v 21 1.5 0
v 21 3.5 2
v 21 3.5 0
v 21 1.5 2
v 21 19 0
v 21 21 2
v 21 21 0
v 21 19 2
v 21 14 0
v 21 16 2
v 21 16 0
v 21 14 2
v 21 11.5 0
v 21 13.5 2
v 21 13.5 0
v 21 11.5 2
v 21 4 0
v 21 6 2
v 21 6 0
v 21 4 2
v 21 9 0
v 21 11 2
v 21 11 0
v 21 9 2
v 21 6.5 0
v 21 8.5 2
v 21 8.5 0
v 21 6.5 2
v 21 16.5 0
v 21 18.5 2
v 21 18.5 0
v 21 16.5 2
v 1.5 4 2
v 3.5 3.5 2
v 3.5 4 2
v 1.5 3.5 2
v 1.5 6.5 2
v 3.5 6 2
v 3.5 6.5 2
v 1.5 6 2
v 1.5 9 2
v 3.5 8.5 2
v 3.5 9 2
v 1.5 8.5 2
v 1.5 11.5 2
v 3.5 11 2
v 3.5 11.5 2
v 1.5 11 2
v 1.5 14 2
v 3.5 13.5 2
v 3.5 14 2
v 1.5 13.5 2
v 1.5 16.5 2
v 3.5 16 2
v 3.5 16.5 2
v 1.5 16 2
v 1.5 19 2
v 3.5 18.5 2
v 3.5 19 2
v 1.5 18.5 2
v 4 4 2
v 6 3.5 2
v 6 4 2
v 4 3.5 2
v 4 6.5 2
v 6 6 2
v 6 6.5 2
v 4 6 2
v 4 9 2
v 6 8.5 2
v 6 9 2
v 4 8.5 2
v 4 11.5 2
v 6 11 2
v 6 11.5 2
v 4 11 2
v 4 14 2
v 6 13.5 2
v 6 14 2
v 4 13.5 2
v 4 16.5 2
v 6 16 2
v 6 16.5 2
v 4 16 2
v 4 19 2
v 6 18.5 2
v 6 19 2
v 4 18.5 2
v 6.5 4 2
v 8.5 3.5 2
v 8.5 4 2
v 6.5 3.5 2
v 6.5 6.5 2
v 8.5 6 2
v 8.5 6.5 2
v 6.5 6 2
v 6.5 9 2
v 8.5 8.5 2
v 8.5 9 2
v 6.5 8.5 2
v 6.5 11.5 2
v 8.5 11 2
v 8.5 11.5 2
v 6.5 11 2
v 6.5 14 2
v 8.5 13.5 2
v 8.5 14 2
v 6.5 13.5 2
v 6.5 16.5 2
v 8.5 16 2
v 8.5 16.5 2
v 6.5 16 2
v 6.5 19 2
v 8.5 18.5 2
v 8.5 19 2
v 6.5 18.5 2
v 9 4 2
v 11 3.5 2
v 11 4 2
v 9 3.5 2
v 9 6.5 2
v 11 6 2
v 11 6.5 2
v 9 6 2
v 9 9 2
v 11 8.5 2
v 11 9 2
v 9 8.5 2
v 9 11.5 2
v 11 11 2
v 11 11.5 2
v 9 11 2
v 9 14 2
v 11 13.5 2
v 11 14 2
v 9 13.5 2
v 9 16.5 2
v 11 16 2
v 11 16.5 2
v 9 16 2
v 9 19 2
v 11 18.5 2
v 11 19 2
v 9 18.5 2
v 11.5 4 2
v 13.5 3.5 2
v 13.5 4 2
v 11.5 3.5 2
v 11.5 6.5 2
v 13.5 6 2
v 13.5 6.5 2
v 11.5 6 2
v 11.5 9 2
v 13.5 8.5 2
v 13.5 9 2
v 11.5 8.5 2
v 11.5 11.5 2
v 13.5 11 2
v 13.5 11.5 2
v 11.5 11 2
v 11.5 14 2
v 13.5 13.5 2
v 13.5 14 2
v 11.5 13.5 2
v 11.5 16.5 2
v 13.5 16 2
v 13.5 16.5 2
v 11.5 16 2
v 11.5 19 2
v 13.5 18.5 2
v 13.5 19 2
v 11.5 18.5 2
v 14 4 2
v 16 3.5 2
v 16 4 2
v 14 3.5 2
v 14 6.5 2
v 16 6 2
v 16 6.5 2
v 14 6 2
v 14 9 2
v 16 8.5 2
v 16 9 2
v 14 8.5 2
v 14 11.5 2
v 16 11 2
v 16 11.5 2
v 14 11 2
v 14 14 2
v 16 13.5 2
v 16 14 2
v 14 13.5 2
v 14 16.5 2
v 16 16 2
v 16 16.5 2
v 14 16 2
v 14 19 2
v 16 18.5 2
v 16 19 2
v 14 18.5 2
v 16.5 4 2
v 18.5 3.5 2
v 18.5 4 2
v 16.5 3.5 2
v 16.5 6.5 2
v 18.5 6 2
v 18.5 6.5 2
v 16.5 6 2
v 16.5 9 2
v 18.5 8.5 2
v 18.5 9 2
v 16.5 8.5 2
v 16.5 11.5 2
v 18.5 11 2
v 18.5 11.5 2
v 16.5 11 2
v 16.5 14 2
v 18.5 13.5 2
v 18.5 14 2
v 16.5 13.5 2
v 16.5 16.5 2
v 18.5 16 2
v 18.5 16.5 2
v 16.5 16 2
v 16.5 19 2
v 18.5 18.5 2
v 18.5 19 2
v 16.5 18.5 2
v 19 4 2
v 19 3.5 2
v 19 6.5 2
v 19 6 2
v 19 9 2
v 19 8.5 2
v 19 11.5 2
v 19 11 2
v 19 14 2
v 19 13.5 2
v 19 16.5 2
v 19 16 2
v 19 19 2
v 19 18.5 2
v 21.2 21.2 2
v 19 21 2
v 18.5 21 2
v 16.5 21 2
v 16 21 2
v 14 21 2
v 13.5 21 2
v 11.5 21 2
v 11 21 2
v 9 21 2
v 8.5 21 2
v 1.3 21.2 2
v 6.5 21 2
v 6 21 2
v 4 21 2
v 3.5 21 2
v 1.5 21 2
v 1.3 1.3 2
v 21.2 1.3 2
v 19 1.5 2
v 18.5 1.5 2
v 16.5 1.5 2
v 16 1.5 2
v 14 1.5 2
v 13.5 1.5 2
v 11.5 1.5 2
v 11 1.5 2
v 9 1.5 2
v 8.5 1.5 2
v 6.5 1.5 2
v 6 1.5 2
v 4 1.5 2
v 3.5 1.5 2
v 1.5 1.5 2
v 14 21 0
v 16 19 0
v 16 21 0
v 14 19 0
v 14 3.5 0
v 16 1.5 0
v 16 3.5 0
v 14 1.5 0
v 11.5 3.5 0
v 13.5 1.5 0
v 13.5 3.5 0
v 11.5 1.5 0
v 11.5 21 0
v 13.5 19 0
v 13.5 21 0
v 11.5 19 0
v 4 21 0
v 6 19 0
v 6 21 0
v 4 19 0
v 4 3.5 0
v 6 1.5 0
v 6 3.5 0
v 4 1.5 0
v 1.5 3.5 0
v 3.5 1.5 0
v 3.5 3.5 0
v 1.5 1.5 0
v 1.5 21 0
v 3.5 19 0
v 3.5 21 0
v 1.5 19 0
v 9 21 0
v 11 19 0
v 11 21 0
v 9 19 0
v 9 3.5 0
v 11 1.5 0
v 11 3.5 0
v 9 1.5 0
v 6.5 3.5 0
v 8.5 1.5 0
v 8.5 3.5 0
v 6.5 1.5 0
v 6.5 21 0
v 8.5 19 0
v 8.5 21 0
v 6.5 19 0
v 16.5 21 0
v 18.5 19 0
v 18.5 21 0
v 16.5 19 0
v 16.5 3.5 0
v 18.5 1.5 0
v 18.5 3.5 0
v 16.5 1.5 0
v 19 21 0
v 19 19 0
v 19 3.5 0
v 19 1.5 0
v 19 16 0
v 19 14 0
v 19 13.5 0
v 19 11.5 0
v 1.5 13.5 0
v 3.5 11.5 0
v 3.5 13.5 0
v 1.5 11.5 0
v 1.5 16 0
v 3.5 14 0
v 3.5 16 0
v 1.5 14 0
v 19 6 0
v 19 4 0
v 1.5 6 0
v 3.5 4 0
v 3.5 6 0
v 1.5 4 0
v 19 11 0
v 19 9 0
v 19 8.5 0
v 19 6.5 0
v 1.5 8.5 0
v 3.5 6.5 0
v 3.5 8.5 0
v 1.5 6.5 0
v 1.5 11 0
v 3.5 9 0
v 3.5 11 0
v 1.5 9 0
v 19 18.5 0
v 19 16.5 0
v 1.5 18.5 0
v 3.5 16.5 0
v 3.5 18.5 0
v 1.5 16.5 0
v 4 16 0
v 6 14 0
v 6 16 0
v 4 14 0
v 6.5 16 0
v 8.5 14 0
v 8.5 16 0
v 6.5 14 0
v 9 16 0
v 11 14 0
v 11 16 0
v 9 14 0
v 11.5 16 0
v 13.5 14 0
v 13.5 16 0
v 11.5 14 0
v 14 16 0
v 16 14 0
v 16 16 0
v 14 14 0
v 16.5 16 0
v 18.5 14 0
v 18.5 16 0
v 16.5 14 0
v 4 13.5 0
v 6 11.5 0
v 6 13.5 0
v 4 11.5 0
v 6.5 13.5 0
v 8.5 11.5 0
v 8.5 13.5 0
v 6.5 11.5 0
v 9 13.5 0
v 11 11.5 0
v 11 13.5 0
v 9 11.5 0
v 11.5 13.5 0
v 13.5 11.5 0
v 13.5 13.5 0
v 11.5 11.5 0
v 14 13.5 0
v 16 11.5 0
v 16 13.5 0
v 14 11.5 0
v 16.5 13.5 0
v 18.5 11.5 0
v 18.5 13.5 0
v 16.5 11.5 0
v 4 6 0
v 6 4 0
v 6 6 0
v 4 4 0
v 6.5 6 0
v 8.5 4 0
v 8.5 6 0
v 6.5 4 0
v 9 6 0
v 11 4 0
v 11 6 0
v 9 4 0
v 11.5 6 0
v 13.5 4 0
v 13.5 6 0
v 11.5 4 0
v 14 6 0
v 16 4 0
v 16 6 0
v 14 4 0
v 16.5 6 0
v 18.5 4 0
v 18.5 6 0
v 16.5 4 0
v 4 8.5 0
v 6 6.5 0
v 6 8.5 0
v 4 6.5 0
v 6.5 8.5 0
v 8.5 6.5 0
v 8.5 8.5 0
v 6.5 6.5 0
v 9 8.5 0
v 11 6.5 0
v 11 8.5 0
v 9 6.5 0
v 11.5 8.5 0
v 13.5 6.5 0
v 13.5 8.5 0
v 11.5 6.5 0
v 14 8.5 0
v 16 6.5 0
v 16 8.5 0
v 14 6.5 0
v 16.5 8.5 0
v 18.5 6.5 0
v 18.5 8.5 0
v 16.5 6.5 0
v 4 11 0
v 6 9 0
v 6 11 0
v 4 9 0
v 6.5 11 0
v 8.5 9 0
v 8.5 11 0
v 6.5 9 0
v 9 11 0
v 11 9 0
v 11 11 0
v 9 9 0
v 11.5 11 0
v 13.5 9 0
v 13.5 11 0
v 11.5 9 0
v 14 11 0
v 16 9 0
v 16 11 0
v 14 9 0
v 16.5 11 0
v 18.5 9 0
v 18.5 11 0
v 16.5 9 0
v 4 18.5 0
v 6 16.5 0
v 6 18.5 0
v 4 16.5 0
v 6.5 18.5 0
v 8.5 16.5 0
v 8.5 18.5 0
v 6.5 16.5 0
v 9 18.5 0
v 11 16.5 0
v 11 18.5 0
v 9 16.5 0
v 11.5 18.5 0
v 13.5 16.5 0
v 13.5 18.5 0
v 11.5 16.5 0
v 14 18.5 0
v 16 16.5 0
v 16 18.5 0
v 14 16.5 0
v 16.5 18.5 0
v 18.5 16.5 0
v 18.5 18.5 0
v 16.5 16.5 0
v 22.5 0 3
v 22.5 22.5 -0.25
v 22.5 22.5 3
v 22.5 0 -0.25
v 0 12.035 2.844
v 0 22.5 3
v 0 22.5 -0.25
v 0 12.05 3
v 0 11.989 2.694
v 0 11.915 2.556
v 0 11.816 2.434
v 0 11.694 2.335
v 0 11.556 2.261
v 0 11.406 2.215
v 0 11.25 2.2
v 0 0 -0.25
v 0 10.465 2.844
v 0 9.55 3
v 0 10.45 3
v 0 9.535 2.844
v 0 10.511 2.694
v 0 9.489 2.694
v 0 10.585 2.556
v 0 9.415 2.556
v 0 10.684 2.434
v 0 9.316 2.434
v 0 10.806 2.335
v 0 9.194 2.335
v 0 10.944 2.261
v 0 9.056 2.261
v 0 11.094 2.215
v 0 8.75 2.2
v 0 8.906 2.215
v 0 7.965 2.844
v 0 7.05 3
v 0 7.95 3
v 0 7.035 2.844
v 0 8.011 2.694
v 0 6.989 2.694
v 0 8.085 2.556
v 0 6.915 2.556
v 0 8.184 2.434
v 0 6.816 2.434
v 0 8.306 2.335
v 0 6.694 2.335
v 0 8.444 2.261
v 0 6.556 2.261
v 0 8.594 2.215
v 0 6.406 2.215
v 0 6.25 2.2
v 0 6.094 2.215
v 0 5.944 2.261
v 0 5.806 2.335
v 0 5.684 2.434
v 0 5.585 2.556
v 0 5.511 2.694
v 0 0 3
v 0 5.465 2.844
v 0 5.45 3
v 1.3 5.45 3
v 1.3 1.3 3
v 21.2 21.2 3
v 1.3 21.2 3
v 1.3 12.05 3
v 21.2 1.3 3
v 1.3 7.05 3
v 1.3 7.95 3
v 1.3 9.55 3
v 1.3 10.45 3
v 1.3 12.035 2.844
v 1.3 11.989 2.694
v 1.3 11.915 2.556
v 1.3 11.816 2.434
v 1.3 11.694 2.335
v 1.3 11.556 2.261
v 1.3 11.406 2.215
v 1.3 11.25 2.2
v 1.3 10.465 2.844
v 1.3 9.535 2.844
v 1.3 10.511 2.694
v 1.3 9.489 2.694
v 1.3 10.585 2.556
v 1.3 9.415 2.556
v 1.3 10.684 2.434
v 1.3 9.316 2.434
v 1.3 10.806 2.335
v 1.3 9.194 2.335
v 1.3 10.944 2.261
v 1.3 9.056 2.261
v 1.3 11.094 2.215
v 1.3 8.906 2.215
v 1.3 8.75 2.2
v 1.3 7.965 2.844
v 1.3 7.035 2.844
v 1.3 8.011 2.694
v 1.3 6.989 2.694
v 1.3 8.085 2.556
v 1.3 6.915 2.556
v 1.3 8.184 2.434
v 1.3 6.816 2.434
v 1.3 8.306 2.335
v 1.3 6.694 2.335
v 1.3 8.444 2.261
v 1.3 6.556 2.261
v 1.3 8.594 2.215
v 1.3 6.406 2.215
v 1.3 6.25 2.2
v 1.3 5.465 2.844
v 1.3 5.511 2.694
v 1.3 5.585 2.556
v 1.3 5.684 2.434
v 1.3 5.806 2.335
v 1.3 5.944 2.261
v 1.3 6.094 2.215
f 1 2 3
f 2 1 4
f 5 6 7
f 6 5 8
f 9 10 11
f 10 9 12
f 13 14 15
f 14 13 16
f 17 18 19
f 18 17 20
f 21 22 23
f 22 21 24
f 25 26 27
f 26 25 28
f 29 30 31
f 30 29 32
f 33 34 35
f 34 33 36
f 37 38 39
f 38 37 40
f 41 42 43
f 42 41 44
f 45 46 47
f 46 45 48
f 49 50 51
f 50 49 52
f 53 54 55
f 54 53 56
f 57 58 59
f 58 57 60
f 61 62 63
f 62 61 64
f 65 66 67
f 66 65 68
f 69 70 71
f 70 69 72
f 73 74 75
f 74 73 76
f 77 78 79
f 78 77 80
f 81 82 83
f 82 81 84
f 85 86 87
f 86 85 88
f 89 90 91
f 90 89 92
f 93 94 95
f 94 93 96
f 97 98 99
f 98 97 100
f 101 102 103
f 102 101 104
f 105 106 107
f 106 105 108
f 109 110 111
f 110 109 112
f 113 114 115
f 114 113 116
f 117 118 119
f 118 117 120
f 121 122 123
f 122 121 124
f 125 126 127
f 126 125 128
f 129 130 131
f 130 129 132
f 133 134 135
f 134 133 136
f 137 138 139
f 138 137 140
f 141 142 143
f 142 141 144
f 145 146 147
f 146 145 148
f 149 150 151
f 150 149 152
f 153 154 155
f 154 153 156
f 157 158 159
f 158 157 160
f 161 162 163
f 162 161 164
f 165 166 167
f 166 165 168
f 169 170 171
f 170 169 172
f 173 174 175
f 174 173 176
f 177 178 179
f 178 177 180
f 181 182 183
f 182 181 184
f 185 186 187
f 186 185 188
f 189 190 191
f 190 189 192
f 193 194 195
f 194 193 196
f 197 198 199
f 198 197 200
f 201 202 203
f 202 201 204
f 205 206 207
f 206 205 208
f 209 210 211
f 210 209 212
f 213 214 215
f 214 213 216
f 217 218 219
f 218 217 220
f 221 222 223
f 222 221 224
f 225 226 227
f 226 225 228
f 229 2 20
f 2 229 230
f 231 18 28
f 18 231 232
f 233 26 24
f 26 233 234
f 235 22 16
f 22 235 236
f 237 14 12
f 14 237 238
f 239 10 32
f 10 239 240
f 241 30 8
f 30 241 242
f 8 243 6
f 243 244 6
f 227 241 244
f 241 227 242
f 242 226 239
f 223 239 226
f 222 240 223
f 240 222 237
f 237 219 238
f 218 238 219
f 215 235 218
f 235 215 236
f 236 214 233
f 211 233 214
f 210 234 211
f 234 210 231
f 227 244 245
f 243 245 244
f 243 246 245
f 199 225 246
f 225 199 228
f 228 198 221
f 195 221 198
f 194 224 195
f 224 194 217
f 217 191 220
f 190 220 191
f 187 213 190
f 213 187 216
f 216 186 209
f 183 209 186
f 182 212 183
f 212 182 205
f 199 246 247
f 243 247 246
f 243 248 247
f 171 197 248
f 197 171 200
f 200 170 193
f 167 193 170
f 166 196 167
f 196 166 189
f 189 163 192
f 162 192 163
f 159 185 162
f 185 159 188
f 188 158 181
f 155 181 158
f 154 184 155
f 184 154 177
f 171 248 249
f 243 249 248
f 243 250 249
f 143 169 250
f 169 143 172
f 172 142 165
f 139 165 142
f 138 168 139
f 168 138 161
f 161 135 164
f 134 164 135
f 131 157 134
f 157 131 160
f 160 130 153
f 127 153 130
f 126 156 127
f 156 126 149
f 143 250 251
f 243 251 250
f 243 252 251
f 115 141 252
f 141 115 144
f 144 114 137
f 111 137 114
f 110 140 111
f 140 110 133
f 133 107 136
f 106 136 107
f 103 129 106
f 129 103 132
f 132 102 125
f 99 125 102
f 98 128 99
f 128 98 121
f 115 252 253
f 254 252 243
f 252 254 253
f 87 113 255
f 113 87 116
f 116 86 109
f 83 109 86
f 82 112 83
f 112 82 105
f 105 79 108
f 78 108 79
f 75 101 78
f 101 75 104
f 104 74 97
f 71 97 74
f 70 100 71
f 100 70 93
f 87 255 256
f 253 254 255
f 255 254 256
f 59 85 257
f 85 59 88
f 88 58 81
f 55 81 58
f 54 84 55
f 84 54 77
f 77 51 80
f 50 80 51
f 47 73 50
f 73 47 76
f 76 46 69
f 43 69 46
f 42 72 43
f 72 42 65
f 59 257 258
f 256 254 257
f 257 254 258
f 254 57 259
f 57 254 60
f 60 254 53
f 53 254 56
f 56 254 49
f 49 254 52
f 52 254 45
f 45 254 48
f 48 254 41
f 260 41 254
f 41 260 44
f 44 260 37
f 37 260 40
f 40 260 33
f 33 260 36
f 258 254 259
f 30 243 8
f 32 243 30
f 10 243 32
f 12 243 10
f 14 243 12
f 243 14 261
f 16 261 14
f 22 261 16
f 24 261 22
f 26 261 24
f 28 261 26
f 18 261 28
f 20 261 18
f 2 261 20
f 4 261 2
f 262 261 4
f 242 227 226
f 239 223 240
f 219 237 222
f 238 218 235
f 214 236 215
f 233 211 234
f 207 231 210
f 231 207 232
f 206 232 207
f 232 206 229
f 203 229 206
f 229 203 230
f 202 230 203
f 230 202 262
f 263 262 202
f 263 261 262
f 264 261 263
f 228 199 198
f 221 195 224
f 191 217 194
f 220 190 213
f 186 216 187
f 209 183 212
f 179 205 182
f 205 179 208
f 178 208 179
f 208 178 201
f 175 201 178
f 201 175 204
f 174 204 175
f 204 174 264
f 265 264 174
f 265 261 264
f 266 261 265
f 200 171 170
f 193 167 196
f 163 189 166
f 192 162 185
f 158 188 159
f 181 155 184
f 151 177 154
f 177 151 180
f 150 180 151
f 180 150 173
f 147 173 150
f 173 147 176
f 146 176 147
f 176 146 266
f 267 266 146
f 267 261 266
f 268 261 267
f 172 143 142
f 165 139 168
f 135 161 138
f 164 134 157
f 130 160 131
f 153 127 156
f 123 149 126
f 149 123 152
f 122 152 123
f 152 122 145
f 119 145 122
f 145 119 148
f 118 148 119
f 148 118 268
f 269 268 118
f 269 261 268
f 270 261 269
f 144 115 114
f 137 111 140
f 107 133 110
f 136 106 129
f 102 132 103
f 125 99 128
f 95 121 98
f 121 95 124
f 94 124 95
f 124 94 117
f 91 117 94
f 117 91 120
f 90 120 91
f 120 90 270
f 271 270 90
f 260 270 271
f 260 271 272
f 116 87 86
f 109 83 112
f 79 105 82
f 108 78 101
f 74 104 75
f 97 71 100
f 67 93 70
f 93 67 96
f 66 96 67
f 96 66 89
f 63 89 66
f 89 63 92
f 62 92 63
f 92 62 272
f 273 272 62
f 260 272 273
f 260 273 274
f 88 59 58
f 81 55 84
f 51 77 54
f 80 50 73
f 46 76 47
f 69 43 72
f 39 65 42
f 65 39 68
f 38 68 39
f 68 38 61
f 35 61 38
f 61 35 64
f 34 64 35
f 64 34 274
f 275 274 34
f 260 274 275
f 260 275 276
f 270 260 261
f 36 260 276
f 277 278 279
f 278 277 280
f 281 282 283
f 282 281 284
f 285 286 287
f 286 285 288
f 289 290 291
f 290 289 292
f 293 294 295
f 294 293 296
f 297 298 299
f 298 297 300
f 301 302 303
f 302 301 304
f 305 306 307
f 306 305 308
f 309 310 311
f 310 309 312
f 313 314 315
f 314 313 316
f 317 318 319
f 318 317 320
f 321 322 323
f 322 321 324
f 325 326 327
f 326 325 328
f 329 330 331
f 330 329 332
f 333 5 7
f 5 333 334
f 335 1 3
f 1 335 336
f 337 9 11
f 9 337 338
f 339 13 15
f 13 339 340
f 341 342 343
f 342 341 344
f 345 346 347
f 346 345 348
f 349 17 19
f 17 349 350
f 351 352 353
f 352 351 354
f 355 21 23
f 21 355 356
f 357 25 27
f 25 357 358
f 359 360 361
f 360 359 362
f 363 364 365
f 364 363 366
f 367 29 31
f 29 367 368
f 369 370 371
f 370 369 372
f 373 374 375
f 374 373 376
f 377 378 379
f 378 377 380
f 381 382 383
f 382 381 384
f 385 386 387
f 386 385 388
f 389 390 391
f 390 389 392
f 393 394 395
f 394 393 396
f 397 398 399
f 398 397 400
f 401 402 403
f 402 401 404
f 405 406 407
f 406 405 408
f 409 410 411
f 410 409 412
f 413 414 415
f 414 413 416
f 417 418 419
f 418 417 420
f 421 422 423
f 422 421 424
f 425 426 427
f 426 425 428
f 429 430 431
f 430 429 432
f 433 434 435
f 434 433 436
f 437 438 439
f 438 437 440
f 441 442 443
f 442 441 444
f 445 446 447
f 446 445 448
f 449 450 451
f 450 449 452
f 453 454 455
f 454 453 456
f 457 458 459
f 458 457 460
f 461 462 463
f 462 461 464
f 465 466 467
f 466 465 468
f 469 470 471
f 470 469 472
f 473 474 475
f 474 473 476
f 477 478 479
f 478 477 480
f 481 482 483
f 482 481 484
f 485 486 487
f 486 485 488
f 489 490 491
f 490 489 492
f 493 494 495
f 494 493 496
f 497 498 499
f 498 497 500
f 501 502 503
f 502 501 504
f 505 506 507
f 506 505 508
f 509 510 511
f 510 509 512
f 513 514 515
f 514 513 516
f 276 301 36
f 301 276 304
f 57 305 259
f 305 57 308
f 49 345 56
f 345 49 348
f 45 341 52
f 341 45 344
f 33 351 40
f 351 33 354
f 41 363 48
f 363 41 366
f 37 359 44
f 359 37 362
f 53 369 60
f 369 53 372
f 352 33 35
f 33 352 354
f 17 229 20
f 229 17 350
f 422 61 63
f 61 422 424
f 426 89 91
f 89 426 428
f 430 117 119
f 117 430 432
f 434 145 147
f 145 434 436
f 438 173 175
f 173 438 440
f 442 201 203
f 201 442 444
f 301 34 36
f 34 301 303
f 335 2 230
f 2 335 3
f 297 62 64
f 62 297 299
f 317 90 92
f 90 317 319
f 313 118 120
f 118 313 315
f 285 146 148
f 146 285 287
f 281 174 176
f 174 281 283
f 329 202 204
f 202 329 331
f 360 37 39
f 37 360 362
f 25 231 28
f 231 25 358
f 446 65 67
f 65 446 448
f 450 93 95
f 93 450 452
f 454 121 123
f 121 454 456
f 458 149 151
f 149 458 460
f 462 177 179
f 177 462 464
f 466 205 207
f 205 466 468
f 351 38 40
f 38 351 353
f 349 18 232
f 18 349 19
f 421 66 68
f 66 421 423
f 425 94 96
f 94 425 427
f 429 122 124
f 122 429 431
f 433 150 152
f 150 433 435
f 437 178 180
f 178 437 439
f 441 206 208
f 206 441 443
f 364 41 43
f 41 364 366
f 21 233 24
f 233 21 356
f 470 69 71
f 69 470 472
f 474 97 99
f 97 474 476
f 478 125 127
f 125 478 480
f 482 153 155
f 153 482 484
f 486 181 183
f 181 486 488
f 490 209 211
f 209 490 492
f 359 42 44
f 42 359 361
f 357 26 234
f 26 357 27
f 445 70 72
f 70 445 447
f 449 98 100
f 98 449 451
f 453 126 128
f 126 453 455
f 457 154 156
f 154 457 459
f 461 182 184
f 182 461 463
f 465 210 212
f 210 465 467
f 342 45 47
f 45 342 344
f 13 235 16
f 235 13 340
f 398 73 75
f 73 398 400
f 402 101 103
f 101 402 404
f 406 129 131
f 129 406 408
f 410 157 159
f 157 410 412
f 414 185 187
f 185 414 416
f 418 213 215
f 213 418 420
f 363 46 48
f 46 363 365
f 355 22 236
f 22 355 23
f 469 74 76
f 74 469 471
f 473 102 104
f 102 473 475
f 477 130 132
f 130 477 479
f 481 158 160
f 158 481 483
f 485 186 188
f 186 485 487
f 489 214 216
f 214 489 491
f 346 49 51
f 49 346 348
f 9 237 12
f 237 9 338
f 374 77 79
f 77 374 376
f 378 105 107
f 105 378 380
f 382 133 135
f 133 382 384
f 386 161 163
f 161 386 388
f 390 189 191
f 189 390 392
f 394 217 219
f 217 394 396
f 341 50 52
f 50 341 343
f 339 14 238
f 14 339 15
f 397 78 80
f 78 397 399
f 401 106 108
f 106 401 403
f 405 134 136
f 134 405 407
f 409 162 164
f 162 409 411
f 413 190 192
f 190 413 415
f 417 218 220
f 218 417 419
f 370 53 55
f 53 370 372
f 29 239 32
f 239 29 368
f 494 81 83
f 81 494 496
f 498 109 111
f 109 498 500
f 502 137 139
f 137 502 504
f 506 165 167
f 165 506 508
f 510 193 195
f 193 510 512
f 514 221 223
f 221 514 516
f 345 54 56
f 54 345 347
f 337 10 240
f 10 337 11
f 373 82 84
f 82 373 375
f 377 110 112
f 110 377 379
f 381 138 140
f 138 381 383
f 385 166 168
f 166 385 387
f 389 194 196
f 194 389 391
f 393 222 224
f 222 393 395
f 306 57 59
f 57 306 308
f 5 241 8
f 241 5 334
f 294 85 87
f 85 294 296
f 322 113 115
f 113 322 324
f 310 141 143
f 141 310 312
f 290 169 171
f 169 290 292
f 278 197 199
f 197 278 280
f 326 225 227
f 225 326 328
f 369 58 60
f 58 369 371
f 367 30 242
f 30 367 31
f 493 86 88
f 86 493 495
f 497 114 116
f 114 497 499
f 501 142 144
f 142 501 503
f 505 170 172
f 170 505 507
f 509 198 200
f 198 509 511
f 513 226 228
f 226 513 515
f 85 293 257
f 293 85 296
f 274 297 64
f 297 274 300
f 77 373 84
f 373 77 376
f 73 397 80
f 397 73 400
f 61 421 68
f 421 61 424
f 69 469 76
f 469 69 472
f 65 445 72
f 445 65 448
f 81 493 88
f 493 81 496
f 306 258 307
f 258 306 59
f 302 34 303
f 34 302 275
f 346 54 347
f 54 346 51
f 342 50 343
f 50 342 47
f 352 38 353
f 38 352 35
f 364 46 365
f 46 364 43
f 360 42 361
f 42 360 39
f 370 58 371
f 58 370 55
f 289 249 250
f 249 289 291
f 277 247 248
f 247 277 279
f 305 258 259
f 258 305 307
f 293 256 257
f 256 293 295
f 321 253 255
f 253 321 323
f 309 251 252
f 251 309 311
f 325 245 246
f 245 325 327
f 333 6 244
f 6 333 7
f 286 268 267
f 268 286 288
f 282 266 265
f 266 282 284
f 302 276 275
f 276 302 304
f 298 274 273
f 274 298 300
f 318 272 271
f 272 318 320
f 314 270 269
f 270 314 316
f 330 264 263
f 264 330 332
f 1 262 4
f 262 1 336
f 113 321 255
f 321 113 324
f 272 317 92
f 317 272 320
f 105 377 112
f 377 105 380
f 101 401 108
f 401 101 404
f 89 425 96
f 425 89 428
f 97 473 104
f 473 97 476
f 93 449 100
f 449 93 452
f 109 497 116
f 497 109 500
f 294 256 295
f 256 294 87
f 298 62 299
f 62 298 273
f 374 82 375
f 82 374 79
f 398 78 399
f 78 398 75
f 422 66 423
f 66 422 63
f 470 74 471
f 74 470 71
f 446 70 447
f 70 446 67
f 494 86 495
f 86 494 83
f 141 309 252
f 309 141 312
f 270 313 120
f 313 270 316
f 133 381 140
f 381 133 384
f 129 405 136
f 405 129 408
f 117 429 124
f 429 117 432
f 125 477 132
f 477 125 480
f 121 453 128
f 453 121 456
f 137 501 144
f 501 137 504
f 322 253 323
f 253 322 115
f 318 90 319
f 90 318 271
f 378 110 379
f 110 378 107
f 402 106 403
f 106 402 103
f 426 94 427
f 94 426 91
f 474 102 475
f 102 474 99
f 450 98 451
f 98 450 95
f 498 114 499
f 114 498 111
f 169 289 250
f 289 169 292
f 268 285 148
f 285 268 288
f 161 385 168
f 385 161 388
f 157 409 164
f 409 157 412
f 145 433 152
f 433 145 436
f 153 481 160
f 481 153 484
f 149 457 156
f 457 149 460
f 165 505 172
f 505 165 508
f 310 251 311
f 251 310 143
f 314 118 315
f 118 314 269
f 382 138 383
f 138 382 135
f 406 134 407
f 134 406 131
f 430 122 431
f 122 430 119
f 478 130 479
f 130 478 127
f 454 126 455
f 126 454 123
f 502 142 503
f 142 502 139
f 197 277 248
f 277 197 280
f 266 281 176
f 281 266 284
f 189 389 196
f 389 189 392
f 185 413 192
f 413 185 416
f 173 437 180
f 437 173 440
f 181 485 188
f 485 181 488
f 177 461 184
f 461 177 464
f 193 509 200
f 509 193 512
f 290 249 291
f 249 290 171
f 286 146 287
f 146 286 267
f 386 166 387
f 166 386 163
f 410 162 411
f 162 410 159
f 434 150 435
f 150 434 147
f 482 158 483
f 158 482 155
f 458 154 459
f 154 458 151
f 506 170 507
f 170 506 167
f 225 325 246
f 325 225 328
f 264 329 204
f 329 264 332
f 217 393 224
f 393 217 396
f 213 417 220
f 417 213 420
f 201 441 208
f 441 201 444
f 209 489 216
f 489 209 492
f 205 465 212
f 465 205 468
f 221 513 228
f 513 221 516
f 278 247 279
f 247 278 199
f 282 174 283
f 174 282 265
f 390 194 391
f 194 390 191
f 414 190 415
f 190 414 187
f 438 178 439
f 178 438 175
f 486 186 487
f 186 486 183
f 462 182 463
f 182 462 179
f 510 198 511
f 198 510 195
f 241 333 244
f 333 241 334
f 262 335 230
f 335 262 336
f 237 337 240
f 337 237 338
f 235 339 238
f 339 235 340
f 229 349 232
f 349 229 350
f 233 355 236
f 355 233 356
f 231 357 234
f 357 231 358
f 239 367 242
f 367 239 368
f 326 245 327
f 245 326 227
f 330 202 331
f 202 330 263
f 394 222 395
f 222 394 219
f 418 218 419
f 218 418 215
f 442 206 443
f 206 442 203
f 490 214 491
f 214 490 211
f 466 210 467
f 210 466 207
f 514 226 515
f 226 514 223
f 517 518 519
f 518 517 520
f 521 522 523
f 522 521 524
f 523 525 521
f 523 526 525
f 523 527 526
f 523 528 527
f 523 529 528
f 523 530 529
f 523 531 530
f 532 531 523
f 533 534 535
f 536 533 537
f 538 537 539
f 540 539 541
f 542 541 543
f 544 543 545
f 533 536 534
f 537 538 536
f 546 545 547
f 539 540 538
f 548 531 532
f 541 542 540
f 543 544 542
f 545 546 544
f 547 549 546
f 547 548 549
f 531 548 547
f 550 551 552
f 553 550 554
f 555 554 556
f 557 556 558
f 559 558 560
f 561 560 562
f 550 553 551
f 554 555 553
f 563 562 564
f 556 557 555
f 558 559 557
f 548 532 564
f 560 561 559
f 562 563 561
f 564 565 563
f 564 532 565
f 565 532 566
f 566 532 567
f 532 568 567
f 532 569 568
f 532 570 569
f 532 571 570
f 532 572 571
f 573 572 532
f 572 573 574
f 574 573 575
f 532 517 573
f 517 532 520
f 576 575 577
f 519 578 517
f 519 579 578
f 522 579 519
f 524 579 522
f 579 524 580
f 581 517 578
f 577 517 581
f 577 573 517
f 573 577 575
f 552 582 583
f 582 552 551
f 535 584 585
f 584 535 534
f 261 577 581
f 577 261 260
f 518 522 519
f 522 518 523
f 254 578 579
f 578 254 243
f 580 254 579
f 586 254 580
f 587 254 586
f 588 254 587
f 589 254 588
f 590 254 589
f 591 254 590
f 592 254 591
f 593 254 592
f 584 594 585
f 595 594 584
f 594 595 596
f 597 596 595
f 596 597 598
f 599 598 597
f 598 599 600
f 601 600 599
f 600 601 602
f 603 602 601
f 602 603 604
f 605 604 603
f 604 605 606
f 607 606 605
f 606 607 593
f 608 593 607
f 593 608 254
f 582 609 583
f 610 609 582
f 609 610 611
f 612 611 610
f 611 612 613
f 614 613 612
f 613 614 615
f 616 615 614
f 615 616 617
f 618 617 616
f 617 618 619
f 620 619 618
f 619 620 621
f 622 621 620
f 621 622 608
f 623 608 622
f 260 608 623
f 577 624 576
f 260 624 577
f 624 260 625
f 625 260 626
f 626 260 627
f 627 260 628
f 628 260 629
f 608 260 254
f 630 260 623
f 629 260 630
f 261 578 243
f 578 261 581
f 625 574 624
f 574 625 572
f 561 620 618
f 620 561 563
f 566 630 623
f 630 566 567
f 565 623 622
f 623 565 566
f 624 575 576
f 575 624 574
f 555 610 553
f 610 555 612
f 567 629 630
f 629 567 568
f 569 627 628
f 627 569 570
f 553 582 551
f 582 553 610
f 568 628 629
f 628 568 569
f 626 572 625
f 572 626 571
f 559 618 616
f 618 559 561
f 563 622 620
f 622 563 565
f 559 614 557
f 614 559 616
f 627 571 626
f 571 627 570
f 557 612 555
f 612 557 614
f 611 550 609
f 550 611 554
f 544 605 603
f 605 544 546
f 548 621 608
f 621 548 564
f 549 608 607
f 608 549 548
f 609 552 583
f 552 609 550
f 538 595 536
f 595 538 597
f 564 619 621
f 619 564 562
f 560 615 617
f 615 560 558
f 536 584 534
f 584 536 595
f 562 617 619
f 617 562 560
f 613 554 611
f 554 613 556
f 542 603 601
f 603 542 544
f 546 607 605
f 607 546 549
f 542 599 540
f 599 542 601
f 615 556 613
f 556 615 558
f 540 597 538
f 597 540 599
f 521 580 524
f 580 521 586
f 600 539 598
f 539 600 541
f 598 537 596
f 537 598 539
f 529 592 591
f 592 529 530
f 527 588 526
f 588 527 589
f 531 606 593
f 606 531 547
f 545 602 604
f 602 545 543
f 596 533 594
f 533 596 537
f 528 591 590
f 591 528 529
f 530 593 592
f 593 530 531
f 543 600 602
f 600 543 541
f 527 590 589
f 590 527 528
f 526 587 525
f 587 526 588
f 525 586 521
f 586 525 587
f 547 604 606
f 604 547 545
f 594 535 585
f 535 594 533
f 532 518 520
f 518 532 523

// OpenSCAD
grid_size_x = 8; // number of pixels on x
grid_size_y = 8; // number of pixels on y

cell_size = 2.5; // pitch between pixels
inner_wall_thickness = 0.5; // I think you get this one
outer_wall_thickness = 1.5; // this one too
inner_wall_height = 2; // minimum TBD by experimentation
outer_wall_height = inner_wall_height + 1;
pcb_tolerance = 0.2; //wiggle room for pcb

hole_size = 0.8; // size for cable holes  

module grid() { // make readable code they said... 
    translate([0, 0, 0])
            cube([grid_size_y * cell_size - inner_wall_thickness + 2 * outer_wall_thickness, outer_wall_thickness, inner_wall_height]);
    translate([0, 0, inner_wall_height])
            cube([grid_size_y * cell_size - inner_wall_thickness + 2 * outer_wall_thickness, outer_wall_thickness - pcb_tolerance, outer_wall_height - inner_wall_height]);
    
    for (y = [1 : 1 : grid_size_x -1]) {
        translate([outer_wall_thickness, y * cell_size + outer_wall_thickness - inner_wall_thickness, 0])
            cube([grid_size_y * cell_size - inner_wall_thickness, inner_wall_thickness, inner_wall_height]);
    }
    
    translate([0, grid_size_x * cell_size + outer_wall_thickness - inner_wall_thickness, 0])
            cube([grid_size_y * cell_size - inner_wall_thickness + 2 * outer_wall_thickness, outer_wall_thickness, inner_wall_height]);
    translate([0, grid_size_x * cell_size + outer_wall_thickness - inner_wall_thickness + pcb_tolerance, inner_wall_height])
           cube([grid_size_y * cell_size - inner_wall_thickness + 2 * outer_wall_thickness, outer_wall_thickness - pcb_tolerance, outer_wall_height - inner_wall_height]);
    
    
    translate([0, 0, 0])
            cube([outer_wall_thickness, grid_size_x * cell_size - inner_wall_thickness + 2 * outer_wall_thickness, inner_wall_height]); 
    translate([0, 0, inner_wall_height])
            cube([outer_wall_thickness - pcb_tolerance, grid_size_x * cell_size - inner_wall_thickness + 2 * outer_wall_thickness, outer_wall_height - inner_wall_height]);
    
    for (x = [1 : 1 : grid_size_y - 1]) {
        translate([x * cell_size + outer_wall_thickness -inner_wall_thickness, outer_wall_thickness, 0])
            cube([inner_wall_thickness, grid_size_x * cell_size - inner_wall_thickness, inner_wall_height]);
    }
    
    translate([grid_size_y * cell_size + outer_wall_thickness - inner_wall_thickness, 0, 0])
            cube([outer_wall_thickness, grid_size_x * cell_size - inner_wall_thickness + 2 * outer_wall_thickness, inner_wall_height]);
    translate([grid_size_y * cell_size + outer_wall_thickness - inner_wall_thickness + pcb_tolerance, 0, inner_wall_height])
            cube([outer_wall_thickness - pcb_tolerance, grid_size_x * cell_size - inner_wall_thickness + 2 * outer_wall_thickness, outer_wall_height - inner_wall_height]);
}

diffusion_thickness = 0.25; //diffusion layer thickness, set to first layer height for your nozzle

translate([0,0,-diffusion_thickness])
color("white") cube([grid_size_y*cell_size+outer_wall_thickness*2 - inner_wall_thickness,grid_size_x*cell_size+outer_wall_thickness*2 - inner_wall_thickness,diffusion_thickness]); //white diffusion layer, 


color([0.9,0.8,1]) difference() { // make hole for cables 
    grid();
    translate([-0.1, cell_size * 2 - inner_wall_thickness/2 + outer_wall_thickness, outer_wall_height])
    rotate([0,90,0])
    cylinder(r=hole_size, h=outer_wall_height + 1, $fn=32);
    translate([-0.1, cell_size * 3 - inner_wall_thickness/2 + outer_wall_thickness, outer_wall_height])
    rotate([0,90,0])
    cylinder(r=hole_size, h=outer_wall_height + 1, $fn=32);
    translate([-0.1, cell_size * 4 - inner_wall_thickness/2 + outer_wall_thickness, outer_wall_height])
    rotate([0,90,0])
    cylinder(r=hole_size, h=outer_wall_height + 1, $fn=32);
    }
